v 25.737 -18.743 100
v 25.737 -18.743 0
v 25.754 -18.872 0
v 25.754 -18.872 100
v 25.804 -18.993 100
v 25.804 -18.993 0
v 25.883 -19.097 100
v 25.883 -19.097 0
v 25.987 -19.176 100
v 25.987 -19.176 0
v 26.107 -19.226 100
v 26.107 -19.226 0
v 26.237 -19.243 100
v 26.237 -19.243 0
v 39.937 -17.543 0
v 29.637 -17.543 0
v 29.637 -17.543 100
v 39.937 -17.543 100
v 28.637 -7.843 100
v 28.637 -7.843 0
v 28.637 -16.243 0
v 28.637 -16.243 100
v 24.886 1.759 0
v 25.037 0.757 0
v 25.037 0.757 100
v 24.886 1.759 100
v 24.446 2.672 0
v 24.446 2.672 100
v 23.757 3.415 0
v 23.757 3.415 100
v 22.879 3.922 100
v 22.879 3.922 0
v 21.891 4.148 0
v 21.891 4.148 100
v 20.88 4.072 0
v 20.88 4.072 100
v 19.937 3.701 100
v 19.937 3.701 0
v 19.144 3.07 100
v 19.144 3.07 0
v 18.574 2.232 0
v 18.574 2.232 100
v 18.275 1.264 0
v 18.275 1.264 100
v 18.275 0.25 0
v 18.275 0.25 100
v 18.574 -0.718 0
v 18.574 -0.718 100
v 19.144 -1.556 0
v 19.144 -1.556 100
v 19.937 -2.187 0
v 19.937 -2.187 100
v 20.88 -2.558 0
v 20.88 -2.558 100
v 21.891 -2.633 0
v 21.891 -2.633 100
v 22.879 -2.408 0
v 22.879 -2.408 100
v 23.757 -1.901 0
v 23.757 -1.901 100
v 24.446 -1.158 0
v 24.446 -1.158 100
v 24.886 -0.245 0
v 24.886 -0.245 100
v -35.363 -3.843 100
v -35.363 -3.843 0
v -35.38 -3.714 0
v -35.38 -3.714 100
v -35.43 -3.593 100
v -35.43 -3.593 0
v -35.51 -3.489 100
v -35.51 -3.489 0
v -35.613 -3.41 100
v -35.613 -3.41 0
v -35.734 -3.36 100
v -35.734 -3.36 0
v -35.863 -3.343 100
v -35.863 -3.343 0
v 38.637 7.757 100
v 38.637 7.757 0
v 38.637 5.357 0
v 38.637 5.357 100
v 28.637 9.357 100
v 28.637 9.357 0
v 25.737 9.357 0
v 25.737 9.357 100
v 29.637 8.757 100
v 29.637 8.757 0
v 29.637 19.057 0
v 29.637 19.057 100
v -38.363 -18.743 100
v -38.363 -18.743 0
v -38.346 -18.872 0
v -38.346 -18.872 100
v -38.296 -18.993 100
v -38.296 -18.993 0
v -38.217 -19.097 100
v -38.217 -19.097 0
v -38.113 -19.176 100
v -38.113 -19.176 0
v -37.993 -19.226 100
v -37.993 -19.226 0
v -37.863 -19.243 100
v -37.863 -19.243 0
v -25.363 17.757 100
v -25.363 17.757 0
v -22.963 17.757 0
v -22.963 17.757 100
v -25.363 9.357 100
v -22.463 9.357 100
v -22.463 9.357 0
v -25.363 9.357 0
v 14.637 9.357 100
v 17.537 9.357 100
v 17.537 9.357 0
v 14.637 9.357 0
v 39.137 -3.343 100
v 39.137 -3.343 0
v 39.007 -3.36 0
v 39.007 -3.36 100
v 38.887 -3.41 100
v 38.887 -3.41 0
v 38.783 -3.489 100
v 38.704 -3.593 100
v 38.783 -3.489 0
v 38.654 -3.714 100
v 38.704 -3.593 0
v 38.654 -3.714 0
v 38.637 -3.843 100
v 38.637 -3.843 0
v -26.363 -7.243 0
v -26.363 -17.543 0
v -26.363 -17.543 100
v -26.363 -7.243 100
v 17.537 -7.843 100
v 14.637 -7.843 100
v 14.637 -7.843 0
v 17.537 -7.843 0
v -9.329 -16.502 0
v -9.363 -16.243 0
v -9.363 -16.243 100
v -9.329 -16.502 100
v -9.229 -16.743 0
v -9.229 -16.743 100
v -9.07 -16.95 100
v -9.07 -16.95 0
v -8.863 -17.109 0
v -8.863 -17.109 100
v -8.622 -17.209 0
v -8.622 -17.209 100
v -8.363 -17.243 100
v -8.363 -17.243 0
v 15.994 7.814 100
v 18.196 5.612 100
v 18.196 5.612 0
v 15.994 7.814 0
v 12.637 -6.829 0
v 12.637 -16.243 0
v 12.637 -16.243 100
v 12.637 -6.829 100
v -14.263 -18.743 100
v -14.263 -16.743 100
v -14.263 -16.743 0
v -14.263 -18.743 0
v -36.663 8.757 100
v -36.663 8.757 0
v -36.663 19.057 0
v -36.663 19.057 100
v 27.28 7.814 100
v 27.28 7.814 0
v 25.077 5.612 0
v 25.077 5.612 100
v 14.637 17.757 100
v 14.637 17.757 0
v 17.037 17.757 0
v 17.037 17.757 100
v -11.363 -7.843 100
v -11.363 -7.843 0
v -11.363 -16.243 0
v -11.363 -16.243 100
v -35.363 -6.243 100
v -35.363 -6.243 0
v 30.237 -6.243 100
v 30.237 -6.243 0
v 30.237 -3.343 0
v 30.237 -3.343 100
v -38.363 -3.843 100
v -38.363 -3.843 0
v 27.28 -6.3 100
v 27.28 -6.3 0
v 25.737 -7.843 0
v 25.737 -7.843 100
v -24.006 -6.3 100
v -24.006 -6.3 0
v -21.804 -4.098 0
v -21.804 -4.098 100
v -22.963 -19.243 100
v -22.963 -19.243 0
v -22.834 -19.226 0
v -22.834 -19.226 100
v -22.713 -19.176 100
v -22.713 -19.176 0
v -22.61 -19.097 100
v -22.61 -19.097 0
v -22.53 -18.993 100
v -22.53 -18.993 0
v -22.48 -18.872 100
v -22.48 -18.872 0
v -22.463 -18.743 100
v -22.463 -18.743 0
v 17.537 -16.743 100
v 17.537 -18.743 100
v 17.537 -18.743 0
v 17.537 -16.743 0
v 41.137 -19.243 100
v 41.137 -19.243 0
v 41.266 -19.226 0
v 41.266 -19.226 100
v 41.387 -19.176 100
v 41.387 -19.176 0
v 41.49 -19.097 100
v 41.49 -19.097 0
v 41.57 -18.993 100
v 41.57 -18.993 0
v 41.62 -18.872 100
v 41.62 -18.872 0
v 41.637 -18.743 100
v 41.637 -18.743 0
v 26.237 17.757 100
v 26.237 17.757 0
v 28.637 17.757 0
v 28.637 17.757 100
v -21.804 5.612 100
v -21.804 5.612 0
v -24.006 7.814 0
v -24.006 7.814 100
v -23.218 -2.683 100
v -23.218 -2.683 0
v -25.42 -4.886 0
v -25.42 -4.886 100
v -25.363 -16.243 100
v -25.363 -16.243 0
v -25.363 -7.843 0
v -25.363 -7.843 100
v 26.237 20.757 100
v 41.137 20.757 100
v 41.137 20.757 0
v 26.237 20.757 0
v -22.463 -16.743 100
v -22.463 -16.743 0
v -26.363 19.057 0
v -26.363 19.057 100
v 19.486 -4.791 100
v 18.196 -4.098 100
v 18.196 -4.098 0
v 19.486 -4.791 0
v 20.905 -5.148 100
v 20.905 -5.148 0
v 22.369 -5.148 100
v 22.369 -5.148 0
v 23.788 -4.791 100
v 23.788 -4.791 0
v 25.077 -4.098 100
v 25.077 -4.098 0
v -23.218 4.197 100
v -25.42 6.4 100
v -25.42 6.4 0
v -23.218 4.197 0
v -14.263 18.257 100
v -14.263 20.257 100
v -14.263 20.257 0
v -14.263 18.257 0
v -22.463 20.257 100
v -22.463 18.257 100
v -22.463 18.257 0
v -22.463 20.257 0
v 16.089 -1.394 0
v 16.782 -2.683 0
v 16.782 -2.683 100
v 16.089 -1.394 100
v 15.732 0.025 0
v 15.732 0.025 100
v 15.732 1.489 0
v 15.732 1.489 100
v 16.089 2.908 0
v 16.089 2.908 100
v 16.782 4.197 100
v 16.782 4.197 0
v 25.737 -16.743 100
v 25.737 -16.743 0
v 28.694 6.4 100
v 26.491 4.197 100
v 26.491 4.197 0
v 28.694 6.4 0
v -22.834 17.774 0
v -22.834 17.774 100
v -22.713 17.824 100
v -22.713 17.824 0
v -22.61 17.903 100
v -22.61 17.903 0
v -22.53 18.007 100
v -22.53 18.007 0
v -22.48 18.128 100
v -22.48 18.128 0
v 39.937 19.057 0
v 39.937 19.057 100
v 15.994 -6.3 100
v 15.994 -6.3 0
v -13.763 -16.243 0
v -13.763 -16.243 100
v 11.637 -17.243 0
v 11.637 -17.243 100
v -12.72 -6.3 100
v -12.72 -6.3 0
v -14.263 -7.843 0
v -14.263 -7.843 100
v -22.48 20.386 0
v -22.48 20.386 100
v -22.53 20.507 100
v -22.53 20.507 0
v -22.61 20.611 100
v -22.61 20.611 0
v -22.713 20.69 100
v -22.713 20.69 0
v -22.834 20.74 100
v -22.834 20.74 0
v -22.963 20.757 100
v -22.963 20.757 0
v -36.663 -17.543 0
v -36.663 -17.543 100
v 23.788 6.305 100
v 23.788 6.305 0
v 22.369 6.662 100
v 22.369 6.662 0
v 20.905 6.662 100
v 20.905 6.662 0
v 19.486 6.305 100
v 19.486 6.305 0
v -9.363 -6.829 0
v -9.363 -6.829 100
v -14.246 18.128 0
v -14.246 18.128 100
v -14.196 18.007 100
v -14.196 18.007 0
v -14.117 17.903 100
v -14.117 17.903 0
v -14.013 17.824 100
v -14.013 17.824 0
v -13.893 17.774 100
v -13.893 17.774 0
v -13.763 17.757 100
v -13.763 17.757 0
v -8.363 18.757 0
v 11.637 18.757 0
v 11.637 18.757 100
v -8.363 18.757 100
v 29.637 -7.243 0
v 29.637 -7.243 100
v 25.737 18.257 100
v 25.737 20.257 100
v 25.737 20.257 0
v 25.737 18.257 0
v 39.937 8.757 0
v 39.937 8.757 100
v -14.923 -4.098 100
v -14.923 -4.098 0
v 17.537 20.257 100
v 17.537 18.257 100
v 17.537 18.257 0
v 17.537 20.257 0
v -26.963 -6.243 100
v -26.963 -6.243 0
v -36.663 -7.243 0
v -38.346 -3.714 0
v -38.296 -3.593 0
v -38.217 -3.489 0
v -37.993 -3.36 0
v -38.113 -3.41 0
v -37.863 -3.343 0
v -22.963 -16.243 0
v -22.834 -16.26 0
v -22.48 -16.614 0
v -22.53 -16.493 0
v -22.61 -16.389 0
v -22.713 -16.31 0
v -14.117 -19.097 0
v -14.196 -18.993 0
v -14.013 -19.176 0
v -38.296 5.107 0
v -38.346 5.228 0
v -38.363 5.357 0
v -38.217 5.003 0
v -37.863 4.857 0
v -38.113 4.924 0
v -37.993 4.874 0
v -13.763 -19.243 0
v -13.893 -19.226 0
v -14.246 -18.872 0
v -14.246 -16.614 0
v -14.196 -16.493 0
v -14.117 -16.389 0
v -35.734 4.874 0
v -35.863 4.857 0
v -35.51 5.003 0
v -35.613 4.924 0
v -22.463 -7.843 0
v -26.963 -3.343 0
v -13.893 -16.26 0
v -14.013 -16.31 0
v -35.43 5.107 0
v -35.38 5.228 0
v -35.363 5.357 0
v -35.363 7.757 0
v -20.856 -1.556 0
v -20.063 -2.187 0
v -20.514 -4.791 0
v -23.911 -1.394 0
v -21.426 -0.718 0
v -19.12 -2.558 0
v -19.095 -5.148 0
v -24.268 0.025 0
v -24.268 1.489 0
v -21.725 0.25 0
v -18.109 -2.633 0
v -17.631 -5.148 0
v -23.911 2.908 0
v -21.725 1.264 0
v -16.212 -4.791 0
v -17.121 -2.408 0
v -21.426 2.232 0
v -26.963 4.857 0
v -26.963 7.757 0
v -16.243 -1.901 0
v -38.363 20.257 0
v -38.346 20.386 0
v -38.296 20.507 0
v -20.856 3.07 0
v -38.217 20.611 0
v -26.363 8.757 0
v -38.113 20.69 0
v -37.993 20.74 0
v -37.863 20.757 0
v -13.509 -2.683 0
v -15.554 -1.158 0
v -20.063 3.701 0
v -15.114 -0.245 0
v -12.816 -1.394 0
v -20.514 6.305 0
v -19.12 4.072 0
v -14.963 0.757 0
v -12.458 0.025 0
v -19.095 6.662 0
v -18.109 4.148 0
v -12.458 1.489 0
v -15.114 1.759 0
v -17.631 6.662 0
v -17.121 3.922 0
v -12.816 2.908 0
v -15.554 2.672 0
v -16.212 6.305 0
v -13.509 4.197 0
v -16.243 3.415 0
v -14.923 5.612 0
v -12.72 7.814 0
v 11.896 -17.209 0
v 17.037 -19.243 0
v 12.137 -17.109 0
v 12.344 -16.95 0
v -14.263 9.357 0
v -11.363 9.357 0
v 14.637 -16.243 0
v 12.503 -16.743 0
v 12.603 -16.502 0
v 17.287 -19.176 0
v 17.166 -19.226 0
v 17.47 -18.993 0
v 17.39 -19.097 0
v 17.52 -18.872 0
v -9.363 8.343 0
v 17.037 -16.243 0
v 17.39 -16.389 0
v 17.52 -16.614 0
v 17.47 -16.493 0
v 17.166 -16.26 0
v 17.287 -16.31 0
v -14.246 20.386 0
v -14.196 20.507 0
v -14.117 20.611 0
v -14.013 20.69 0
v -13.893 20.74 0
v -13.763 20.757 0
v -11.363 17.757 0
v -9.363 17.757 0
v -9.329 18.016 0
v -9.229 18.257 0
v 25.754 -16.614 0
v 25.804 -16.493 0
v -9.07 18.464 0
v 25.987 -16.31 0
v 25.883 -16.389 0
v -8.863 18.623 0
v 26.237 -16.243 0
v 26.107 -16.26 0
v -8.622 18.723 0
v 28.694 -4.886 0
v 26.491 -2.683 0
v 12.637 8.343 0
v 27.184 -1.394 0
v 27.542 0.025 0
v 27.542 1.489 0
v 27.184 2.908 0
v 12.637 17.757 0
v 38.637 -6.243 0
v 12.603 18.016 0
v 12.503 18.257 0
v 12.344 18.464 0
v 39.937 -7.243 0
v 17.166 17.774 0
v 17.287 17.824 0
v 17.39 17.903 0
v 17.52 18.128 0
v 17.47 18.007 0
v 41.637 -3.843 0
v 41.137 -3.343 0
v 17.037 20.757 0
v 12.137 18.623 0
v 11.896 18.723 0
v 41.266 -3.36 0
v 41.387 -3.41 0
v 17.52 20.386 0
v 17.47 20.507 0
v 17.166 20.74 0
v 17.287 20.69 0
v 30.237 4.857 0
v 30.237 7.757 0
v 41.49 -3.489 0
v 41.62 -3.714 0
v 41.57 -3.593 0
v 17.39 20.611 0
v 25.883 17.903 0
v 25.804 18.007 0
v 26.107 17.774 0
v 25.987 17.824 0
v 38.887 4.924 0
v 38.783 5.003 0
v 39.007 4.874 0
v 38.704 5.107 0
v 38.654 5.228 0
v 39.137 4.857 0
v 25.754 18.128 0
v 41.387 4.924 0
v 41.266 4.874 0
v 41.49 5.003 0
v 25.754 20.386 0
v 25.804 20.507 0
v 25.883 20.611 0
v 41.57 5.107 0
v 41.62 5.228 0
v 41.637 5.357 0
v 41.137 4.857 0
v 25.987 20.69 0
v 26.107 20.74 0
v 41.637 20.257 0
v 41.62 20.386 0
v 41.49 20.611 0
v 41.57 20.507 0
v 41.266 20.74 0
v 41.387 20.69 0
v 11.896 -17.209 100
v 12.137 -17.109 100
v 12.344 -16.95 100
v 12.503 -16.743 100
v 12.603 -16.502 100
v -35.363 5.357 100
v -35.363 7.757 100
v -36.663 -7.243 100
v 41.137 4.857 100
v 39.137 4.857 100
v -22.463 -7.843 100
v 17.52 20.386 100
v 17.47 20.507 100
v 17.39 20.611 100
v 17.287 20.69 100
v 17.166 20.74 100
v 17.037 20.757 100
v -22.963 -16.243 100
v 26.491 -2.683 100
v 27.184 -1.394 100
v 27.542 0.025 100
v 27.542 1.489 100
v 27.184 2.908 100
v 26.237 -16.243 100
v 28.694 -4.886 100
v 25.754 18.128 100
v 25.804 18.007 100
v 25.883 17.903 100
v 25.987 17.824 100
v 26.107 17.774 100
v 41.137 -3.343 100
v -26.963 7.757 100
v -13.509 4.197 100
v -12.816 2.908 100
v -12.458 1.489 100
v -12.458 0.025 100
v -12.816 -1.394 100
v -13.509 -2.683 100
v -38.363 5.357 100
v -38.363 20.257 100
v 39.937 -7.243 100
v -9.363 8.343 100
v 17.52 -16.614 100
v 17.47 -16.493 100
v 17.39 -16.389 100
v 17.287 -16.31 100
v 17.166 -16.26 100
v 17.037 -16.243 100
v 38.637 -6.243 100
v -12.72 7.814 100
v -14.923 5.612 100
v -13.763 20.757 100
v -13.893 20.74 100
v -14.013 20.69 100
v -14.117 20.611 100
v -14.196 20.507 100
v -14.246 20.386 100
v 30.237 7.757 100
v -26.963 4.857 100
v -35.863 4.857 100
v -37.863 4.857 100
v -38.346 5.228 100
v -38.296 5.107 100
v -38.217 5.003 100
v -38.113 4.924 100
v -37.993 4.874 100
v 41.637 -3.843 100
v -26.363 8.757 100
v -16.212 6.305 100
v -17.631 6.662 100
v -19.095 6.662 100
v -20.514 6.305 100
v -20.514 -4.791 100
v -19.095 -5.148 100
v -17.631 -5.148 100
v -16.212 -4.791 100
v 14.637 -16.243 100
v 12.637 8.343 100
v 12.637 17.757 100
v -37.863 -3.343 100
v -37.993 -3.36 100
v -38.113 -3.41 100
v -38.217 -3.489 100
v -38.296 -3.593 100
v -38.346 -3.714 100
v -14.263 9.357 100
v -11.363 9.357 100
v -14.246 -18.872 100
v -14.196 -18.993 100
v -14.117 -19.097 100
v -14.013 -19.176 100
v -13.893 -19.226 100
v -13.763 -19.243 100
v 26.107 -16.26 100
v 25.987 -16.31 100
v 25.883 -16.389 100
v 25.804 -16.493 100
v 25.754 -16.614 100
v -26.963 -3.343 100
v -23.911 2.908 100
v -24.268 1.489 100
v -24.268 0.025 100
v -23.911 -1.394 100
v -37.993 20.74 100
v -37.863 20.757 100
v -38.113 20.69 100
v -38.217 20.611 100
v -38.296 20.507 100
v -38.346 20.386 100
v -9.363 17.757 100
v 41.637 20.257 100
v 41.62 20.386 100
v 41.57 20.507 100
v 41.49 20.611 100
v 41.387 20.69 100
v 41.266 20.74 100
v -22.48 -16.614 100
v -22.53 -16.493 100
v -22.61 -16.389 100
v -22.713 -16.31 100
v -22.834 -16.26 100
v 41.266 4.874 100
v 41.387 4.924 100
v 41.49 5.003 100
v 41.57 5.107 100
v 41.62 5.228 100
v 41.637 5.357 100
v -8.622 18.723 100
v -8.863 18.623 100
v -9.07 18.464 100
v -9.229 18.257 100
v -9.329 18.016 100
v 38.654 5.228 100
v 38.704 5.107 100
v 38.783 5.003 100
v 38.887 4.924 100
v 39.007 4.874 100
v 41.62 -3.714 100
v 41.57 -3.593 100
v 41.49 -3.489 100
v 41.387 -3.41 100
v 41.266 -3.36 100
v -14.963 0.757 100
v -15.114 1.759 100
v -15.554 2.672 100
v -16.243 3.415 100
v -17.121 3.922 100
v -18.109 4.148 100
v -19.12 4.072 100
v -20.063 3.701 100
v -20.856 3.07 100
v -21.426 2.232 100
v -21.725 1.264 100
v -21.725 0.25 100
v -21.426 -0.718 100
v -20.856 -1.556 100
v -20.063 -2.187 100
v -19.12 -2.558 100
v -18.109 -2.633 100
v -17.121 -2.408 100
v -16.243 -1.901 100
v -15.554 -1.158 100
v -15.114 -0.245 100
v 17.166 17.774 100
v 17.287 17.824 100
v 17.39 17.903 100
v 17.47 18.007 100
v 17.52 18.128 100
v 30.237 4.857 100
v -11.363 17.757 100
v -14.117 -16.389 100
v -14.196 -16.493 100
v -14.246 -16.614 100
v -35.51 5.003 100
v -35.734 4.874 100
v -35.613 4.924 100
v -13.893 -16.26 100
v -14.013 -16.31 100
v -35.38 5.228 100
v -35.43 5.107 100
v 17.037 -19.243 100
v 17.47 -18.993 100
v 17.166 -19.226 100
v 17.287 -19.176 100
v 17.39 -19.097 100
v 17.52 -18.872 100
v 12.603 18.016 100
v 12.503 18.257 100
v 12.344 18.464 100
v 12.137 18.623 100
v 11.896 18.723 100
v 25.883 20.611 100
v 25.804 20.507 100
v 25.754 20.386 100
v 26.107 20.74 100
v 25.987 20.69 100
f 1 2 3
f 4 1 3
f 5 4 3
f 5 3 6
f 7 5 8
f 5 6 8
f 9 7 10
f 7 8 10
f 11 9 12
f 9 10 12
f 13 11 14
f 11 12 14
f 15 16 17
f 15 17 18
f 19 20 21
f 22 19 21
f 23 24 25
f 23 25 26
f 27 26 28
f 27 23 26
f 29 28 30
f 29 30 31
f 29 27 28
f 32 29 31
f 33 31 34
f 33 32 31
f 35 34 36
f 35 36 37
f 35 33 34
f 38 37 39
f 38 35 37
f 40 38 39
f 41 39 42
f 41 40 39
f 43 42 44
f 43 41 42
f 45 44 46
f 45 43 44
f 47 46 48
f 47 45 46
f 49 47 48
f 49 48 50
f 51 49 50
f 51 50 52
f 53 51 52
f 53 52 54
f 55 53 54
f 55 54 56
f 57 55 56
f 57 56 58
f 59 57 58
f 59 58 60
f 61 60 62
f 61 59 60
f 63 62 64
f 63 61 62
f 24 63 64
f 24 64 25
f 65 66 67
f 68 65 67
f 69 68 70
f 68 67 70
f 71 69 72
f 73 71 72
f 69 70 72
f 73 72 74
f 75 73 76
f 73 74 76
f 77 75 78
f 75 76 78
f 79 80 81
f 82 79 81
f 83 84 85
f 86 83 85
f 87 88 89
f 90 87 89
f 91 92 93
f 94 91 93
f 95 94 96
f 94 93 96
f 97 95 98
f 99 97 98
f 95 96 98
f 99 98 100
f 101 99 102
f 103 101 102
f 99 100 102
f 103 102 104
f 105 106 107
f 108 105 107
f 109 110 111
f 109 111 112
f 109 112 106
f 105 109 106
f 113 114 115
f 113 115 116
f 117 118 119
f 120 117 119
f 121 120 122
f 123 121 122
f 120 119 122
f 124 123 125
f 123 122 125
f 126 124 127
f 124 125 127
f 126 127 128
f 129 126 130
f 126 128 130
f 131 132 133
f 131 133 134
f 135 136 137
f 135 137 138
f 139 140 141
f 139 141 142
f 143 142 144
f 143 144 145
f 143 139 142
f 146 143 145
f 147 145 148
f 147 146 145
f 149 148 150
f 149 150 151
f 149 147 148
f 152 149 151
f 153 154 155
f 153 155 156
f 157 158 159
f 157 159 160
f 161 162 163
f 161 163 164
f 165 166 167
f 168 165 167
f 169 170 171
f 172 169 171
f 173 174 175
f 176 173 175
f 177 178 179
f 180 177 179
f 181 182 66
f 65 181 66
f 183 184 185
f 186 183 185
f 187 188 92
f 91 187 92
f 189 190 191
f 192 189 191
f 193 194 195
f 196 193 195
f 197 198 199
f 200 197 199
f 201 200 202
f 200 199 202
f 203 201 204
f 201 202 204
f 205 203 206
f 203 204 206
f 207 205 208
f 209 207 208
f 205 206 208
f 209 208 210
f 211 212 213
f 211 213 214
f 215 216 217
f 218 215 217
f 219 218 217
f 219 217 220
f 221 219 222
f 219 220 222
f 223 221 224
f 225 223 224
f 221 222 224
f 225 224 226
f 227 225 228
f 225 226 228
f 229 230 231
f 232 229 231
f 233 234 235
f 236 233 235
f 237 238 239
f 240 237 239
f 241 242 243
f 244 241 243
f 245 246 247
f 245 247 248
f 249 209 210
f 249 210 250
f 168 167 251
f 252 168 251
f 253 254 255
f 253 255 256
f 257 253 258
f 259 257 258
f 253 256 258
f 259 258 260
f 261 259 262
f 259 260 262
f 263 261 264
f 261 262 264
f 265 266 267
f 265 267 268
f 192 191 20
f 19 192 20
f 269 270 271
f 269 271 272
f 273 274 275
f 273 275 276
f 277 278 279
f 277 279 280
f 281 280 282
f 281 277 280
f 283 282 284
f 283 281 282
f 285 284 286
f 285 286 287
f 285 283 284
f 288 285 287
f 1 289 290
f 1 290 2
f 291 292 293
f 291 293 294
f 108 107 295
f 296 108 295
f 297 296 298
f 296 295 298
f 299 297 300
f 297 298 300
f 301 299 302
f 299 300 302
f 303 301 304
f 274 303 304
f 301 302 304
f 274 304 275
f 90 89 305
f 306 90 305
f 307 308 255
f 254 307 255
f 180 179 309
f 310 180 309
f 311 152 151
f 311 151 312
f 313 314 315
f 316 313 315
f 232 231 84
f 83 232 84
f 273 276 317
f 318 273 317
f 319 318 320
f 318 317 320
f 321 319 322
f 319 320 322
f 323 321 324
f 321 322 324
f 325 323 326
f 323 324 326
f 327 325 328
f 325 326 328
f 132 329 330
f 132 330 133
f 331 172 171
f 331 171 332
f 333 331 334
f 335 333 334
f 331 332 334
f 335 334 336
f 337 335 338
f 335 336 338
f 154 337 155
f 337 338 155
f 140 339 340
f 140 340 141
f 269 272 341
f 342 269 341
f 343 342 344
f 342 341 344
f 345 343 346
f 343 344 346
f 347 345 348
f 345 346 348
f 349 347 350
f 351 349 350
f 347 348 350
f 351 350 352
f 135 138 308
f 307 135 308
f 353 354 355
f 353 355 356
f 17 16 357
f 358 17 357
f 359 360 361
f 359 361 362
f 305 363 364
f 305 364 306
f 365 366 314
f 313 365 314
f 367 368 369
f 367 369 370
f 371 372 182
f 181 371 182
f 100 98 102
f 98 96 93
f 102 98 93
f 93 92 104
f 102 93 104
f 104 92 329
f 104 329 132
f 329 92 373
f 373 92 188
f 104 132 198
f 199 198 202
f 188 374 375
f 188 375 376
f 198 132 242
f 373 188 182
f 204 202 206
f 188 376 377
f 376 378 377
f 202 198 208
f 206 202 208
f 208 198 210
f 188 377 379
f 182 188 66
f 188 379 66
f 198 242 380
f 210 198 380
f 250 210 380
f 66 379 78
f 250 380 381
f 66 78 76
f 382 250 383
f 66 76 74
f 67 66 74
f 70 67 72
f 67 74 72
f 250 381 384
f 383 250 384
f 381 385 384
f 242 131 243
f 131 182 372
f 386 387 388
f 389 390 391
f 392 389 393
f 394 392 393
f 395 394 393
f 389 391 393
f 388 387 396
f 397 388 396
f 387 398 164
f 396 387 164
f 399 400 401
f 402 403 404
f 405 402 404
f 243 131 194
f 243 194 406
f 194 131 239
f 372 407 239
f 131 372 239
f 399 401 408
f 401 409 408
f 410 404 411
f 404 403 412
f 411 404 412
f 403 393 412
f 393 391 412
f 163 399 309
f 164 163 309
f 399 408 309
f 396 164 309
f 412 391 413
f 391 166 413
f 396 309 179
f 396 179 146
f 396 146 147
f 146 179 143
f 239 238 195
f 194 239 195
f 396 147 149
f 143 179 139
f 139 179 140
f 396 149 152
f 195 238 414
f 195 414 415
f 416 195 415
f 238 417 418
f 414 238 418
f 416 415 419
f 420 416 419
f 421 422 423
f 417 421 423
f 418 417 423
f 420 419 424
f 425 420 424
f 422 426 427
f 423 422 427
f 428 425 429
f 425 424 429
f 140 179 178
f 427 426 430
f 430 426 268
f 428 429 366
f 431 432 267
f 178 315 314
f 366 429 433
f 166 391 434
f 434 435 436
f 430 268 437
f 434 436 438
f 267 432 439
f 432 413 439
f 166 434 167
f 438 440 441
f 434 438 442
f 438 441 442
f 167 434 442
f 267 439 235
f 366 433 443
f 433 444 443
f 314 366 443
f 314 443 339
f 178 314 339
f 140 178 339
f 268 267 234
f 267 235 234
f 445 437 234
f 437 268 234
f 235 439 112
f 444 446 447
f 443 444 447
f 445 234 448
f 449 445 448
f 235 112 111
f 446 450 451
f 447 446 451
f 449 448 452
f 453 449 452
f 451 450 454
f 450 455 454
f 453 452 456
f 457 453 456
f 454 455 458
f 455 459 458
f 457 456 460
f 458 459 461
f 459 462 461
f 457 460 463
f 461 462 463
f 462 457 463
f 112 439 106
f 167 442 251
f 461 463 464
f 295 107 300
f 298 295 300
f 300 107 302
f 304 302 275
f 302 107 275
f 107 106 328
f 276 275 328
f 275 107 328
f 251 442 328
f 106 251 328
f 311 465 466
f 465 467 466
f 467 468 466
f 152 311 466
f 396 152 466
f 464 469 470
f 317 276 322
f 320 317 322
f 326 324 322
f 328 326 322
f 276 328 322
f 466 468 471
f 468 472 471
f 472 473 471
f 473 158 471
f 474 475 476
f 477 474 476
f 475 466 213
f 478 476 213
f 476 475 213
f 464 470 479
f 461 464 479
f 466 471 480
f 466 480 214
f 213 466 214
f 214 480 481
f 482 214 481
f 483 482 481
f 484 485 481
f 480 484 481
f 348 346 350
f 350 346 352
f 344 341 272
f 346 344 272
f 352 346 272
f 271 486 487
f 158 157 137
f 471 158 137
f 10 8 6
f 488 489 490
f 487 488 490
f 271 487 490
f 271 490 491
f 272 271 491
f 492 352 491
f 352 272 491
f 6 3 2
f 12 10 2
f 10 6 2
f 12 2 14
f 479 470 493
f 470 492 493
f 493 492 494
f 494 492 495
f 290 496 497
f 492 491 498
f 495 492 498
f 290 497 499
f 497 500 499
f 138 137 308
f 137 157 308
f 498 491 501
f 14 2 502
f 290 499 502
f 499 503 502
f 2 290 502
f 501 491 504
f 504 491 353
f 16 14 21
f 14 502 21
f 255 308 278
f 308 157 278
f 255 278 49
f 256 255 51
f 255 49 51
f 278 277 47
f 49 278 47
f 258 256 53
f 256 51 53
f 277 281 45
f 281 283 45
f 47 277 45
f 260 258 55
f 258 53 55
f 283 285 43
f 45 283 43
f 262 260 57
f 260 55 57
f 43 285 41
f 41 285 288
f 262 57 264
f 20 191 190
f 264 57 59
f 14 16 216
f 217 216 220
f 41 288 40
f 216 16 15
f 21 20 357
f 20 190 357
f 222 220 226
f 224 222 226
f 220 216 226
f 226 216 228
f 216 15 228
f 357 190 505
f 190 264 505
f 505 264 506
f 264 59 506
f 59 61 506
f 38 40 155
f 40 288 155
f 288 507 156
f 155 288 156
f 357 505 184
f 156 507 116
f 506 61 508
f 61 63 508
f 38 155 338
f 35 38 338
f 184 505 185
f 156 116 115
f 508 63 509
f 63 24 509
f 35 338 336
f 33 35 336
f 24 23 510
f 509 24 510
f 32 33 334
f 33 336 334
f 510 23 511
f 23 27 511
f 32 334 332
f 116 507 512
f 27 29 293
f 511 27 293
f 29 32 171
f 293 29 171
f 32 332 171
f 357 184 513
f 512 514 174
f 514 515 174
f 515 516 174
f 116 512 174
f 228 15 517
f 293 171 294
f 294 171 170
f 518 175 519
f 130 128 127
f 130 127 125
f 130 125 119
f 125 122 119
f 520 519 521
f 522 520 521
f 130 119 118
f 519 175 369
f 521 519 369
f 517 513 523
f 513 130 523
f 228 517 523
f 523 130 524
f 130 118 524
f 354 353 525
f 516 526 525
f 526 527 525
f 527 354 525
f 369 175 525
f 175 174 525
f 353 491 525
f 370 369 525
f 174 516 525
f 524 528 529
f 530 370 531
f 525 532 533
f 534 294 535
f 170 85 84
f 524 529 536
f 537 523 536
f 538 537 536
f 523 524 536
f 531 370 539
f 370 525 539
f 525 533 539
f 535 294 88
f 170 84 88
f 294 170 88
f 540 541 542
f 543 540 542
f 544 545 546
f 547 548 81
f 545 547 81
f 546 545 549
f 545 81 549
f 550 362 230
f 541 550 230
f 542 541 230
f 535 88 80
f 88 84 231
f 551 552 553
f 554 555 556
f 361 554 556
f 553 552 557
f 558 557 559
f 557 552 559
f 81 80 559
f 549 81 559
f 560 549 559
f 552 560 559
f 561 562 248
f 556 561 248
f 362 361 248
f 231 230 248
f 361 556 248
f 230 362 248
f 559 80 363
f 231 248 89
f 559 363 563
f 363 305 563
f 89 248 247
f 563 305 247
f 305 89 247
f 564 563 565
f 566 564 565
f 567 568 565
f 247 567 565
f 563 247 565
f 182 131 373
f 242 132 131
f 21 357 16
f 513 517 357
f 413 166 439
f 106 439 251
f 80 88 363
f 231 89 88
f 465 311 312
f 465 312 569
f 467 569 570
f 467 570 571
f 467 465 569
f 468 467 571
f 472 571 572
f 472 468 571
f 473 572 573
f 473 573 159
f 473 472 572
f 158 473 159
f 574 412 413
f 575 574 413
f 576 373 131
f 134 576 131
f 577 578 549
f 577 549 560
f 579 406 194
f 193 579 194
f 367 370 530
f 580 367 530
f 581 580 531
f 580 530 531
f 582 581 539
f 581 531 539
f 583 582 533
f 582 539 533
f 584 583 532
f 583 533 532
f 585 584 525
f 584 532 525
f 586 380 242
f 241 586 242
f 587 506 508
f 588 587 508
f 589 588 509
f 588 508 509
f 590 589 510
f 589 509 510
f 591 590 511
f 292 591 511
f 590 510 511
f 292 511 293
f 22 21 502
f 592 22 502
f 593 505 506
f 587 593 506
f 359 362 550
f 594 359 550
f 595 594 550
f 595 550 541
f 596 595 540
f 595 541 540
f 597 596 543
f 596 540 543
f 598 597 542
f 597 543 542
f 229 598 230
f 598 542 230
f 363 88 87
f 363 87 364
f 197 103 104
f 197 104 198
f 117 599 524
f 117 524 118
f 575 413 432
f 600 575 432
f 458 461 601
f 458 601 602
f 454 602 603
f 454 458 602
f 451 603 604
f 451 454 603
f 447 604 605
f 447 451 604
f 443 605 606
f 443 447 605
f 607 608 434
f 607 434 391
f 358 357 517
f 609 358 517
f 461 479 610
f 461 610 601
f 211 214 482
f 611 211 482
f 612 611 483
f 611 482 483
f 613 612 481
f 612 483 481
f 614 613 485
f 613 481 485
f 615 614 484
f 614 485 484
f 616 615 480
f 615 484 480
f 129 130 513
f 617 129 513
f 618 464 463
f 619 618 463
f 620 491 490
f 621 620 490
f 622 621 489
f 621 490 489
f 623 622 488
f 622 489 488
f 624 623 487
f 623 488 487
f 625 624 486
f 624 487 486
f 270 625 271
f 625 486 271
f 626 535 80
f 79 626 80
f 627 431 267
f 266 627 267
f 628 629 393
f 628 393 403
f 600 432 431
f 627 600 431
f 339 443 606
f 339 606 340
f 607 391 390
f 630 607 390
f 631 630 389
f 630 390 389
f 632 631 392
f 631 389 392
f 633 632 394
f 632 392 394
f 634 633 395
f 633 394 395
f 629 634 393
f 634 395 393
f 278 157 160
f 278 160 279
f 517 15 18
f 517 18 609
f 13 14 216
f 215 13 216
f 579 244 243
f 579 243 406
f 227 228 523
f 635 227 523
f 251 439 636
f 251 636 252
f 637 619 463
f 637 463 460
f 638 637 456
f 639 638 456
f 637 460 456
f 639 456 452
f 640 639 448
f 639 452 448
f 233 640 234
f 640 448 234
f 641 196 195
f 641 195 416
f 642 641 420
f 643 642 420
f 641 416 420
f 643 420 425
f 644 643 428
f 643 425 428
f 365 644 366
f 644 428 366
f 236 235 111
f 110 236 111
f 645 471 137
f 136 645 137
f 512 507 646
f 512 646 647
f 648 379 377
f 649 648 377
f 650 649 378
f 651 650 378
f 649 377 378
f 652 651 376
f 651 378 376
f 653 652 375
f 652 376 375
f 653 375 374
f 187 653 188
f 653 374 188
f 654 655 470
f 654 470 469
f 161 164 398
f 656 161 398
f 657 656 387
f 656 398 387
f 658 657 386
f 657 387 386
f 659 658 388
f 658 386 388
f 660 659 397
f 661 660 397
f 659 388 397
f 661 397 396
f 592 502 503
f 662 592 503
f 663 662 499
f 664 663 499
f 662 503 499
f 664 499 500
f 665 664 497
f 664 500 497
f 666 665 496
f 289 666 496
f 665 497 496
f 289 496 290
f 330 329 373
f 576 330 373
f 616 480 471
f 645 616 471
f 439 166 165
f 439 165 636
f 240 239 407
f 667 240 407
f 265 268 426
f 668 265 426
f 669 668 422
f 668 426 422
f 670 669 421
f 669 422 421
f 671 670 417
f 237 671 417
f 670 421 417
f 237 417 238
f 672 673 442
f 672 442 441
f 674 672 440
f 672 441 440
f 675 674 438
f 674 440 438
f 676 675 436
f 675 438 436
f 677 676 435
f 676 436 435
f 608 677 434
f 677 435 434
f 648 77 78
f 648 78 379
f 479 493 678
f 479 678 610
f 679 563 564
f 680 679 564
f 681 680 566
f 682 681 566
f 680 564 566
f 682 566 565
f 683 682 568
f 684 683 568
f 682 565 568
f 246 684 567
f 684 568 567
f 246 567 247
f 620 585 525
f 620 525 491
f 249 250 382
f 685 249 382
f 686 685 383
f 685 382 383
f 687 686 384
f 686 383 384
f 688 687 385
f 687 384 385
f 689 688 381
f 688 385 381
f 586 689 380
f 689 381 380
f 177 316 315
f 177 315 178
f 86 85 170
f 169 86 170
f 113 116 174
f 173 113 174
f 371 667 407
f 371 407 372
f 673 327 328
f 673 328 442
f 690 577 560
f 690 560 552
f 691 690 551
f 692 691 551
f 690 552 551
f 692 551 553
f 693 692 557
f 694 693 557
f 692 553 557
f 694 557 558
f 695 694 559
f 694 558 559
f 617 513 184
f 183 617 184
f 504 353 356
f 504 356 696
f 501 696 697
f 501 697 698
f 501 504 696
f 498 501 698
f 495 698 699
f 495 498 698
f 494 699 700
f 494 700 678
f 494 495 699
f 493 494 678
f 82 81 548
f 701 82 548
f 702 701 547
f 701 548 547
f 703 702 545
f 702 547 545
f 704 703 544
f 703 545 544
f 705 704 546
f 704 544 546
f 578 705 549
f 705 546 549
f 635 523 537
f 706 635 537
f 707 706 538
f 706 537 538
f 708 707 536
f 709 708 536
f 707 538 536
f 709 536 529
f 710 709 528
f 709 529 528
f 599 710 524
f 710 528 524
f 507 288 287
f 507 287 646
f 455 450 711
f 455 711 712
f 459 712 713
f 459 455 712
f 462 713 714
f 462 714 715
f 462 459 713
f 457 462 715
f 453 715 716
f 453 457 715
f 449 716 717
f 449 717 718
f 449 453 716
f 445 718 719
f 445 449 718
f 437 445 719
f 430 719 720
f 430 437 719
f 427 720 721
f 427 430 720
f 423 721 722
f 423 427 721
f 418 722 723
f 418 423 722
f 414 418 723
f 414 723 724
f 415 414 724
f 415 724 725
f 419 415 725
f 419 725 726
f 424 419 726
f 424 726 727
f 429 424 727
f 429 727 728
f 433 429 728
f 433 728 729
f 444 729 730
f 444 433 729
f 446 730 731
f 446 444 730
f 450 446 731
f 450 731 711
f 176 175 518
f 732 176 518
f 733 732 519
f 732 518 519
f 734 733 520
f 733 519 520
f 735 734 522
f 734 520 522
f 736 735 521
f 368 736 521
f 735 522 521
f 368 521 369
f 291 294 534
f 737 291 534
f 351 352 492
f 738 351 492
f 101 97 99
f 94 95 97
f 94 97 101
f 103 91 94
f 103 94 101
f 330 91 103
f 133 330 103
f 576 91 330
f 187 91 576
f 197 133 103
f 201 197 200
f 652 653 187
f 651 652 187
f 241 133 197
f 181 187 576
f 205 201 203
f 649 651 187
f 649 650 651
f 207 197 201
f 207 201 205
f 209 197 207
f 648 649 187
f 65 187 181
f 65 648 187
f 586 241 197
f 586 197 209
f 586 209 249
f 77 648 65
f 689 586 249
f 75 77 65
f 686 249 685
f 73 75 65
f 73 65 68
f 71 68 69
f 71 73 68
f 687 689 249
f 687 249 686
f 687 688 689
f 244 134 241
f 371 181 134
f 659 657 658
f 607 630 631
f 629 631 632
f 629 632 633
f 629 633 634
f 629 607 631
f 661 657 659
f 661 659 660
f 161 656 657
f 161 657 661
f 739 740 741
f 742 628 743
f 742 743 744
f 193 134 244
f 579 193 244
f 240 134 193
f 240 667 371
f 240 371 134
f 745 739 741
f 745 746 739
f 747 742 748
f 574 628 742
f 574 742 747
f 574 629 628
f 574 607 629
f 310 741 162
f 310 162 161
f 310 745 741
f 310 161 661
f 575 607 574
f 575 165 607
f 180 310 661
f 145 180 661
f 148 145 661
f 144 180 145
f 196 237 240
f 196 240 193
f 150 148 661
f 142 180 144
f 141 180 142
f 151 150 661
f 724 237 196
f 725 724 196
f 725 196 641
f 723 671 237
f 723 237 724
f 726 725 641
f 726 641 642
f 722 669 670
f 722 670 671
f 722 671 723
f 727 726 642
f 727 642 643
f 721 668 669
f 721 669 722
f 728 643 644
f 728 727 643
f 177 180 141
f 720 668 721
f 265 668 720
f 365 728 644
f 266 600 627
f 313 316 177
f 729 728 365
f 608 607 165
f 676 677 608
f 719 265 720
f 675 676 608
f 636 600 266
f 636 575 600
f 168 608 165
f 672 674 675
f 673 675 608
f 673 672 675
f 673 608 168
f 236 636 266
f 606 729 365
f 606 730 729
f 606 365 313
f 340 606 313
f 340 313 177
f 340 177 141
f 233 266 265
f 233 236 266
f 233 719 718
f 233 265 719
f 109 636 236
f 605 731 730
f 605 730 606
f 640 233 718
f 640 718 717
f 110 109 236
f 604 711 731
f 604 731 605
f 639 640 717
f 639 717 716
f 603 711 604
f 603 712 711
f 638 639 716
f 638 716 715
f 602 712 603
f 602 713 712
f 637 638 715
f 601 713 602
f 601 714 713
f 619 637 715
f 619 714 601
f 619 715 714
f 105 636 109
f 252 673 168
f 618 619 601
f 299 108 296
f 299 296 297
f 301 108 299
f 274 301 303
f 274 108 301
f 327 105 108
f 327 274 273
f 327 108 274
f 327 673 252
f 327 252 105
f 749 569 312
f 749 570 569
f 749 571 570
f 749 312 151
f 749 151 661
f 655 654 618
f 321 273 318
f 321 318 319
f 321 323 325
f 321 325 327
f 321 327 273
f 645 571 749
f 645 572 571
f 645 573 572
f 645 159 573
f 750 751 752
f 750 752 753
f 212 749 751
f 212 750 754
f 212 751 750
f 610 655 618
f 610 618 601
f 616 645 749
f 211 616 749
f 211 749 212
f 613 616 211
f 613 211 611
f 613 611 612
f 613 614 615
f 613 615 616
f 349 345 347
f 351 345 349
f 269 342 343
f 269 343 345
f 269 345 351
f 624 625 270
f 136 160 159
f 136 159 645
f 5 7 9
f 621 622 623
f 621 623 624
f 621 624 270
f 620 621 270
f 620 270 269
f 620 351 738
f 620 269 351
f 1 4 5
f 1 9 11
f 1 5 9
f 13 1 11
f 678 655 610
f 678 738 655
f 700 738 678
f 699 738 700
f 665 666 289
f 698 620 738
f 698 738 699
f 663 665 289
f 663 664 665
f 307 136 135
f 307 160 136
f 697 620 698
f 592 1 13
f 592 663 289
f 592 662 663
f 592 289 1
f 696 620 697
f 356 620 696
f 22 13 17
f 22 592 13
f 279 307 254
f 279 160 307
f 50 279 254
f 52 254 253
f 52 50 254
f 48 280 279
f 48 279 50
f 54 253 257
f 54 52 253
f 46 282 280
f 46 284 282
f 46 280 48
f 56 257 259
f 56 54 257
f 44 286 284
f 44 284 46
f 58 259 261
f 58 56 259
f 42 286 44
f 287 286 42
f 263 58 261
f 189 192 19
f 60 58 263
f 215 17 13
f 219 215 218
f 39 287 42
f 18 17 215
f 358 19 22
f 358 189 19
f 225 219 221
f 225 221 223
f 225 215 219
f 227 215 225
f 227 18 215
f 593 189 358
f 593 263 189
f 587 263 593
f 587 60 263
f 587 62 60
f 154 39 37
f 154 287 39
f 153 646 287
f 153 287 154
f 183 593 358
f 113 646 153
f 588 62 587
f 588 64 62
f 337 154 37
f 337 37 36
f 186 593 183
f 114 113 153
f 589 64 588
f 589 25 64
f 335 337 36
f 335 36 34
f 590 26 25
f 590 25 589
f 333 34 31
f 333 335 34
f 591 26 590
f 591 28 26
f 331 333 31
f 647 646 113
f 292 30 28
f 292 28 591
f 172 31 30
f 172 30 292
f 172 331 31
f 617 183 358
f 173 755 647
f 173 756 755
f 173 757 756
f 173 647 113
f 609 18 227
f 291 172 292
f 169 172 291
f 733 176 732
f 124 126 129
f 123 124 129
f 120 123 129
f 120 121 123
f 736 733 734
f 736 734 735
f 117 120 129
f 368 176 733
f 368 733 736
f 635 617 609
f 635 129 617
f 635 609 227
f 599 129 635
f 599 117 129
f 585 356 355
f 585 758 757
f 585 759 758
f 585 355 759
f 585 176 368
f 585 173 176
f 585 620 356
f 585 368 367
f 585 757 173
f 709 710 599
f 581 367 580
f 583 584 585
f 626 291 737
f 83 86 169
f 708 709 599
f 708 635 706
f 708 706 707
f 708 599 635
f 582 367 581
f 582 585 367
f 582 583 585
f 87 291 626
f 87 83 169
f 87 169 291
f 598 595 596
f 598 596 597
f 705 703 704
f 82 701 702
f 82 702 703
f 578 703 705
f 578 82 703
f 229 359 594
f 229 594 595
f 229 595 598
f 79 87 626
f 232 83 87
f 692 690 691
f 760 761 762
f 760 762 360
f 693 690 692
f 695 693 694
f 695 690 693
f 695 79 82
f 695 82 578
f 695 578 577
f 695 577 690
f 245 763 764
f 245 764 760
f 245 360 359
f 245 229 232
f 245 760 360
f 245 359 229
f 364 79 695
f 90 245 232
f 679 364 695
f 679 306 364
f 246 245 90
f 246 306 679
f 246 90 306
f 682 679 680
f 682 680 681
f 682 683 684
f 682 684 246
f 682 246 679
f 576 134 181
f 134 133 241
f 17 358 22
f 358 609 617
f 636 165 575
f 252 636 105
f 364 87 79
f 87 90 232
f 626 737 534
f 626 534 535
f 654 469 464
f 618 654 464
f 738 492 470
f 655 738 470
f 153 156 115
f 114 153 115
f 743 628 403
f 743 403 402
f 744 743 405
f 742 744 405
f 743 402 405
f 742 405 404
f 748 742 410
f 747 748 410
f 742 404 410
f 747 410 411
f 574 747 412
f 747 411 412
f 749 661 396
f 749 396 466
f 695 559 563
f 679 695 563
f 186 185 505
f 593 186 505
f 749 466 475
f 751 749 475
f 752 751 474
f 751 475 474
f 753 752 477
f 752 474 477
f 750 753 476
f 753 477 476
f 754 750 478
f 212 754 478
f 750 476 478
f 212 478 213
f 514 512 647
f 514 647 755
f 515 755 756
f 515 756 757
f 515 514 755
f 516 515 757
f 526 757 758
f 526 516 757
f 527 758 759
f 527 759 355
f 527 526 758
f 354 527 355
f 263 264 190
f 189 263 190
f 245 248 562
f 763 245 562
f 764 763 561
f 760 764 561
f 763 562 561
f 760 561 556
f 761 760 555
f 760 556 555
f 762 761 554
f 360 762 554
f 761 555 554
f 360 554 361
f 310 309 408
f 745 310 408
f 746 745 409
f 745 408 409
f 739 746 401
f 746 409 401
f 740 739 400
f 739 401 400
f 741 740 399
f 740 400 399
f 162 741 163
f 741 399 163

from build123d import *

# Parameters (mm, degrees)
SKETCH_1_R      = 3.4
SKETCH_1_W      = 10.3
SKETCH_1_H      = 10.3
EXTRUDE_1_DEPTH = 100


with BuildPart() as part:
    # 草图1 → 凸台-拉伸1 (new body)
    with BuildSketch(Plane.XY):
        with BuildLine():
            Line((-22.463172707, 9.357012623), (-25.363172707, 9.357012623))
            Line((-25.363172707, 9.357012623), (-25.363172707, 17.757012623))
            Line((-25.363172707, 17.757012623), (-22.963172707, 17.757012623))
            ThreePointArc((-22.963172707, 17.757012623), (-22.609619316, 17.903459232), (-22.463172707, 18.257012623))
            Line((-22.463172707, 18.257012623), (-22.463172707, 20.257012623))
            ThreePointArc((-22.463172707, 20.257012623), (-22.609619316, 20.610566013), (-22.963172707, 20.757012623))
            Line((-22.963172707, 20.757012623), (-37.863172707, 20.757012623))
            ThreePointArc((-37.863172707, 20.757012623), (-38.216726098, 20.610566013), (-38.363172707, 20.257012623))
            Line((-38.363172707, 20.257012623), (-38.363172707, 5.357012623))
            ThreePointArc((-38.363172707, 5.357012623), (-38.216726098, 5.003459232), (-37.863172707, 4.857012623))
            Line((-37.863172707, 4.857012623), (-35.863172707, 4.857012623))
            ThreePointArc((-35.863172707, 4.857012623), (-35.509619316, 5.003459232), (-35.363172707, 5.357012623))
            Line((-35.363172707, 5.357012623), (-35.363172707, 7.757012623))
            Line((-35.363172707, 7.757012623), (-26.963172707, 7.757012623))
            Line((-26.963172707, 7.757012623), (-26.963172707, 4.857012623))
            Line((-26.963172707, 4.857012623), (-25.420279488, 6.399905842))
            Line((-25.420279488, 6.399905842), (-23.217718457, 4.19734481))
            ThreePointArc((-23.217718457, 4.19734481), (-24.313172707, 0.757012623), (-23.217718457, -2.683319565))
            Line((-23.217718457, -2.683319565), (-25.420279488, -4.885880596))
            Line((-25.420279488, -4.885880596), (-26.963172707, -3.342987377))
            Line((-26.963172707, -3.342987377), (-26.963172707, -6.242987377))
            Line((-26.963172707, -6.242987377), (-35.363172707, -6.242987377))
            Line((-35.363172707, -6.242987377), (-35.363172707, -3.842987377))
            ThreePointArc((-35.363172707, -3.842987377), (-35.509619316, -3.489433987), (-35.863172707, -3.342987377))
            Line((-35.863172707, -3.342987377), (-37.863172707, -3.342987377))
            ThreePointArc((-37.863172707, -3.342987377), (-38.216726098, -3.489433987), (-38.363172707, -3.842987377))
            Line((-38.363172707, -3.842987377), (-38.363172707, -18.742987377))
            ThreePointArc((-38.363172707, -18.742987377), (-38.216726098, -19.096540768), (-37.863172707, -19.242987377))
            Line((-37.863172707, -19.242987377), (-22.963172707, -19.242987377))
            ThreePointArc((-22.963172707, -19.242987377), (-22.609619316, -19.096540768), (-22.463172707, -18.742987377))
            Line((-22.463172707, -18.742987377), (-22.463172707, -16.742987377))
            ThreePointArc((-22.463172707, -16.742987377), (-22.609619316, -16.389433987), (-22.963172707, -16.242987377))
            Line((-22.963172707, -16.242987377), (-25.363172707, -16.242987377))
            Line((-25.363172707, -16.242987377), (-25.363172707, -7.842987377))
            Line((-25.363172707, -7.842987377), (-22.463172707, -7.842987377))
            Line((-22.463172707, -7.842987377), (-24.006065926, -6.300094158))
            Line((-24.006065926, -6.300094158), (-21.803504895, -4.097533127))
            ThreePointArc((-21.803504895, -4.097533127), (-18.363172707, -5.192987377), (-14.922840519, -4.097533127))
            Line((-14.922840519, -4.097533127), (-12.720279488, -6.300094158))
            Line((-12.720279488, -6.300094158), (-14.263172707, -7.842987377))
            Line((-14.263172707, -7.842987377), (-11.363172707, -7.842987377))
            Line((-11.363172707, -7.842987377), (-11.363172707, -16.242987377))
            Line((-11.363172707, -16.242987377), (-13.763172707, -16.242987377))
            ThreePointArc((-13.763172707, -16.242987377), (-14.116726098, -16.389433987), (-14.263172707, -16.742987377))
            Line((-14.263172707, -16.742987377), (-14.263172707, -18.742987377))
            ThreePointArc((-14.263172707, -18.742987377), (-14.116726098, -19.096540768), (-13.763172707, -19.242987377))
            Line((-13.763172707, -19.242987377), (1.136827293, -19.242987377))
            Line((1.136827293, -19.242987377), (2.136827293, -19.242987377))
            Line((2.136827293, -19.242987377), (17.036827293, -19.242987377))
            ThreePointArc((17.036827293, -19.242987377), (17.390380684, -19.096540768), (17.536827293, -18.742987377))
            Line((17.536827293, -18.742987377), (17.536827293, -16.742987377))
            ThreePointArc((17.536827293, -16.742987377), (17.390380684, -16.389433987), (17.036827293, -16.242987377))
            Line((17.036827293, -16.242987377), (14.636827293, -16.242987377))
            Line((14.636827293, -16.242987377), (14.636827293, -7.842987377))
            Line((14.636827293, -7.842987377), (17.536827293, -7.842987377))
            Line((17.536827293, -7.842987377), (15.993934074, -6.300094158))
            Line((15.993934074, -6.300094158), (18.196495105, -4.097533127))
            ThreePointArc((18.196495105, -4.097533127), (21.636827293, -5.192987377), (25.077159481, -4.097533127))
            Line((25.077159481, -4.097533127), (27.279720512, -6.300094158))
            Line((27.279720512, -6.300094158), (25.736827293, -7.842987377))
            Line((25.736827293, -7.842987377), (28.636827293, -7.842987377))
            Line((28.636827293, -7.842987377), (28.636827293, -16.242987377))
            Line((28.636827293, -16.242987377), (26.236827293, -16.242987377))
            ThreePointArc((26.236827293, -16.242987377), (25.883273902, -16.389433987), (25.736827293, -16.742987377))
            Line((25.736827293, -16.742987377), (25.736827293, -18.742987377))
            ThreePointArc((25.736827293, -18.742987377), (25.883273902, -19.096540768), (26.236827293, -19.242987377))
            Line((26.236827293, -19.242987377), (41.136827293, -19.242987377))
            ThreePointArc((41.136827293, -19.242987377), (41.490380684, -19.096540768), (41.636827293, -18.742987377))
            Line((41.636827293, -18.742987377), (41.636827293, -3.842987377))
            ThreePointArc((41.636827293, -3.842987377), (41.490380684, -3.489433987), (41.136827293, -3.342987377))
            Line((41.136827293, -3.342987377), (39.136827293, -3.342987377))
            ThreePointArc((39.136827293, -3.342987377), (38.783273902, -3.489433987), (38.636827293, -3.842987377))
            Line((38.636827293, -3.842987377), (38.636827293, -6.242987377))
            Line((38.636827293, -6.242987377), (30.236827293, -6.242987377))
            Line((30.236827293, -6.242987377), (30.236827293, -3.342987377))
            Line((30.236827293, -3.342987377), (28.693934074, -4.885880596))
            Line((28.693934074, -4.885880596), (26.491373043, -2.683319565))
            ThreePointArc((26.491373043, -2.683319565), (27.586827293, 0.757012623), (26.491373043, 4.19734481))
            Line((26.491373043, 4.19734481), (28.693934074, 6.399905842))
            Line((28.693934074, 6.399905842), (30.236827293, 4.857012623))
            Line((30.236827293, 4.857012623), (30.236827293, 7.757012623))
            Line((30.236827293, 7.757012623), (38.636827293, 7.757012623))
            Line((38.636827293, 7.757012623), (38.636827293, 5.357012623))
            ThreePointArc((38.636827293, 5.357012623), (38.783273902, 5.003459232), (39.136827293, 4.857012623))
            Line((39.136827293, 4.857012623), (41.136827293, 4.857012623))
            ThreePointArc((41.136827293, 4.857012623), (41.490380684, 5.003459232), (41.636827293, 5.357012623))
            Line((41.636827293, 5.357012623), (41.636827293, 20.257012623))
            ThreePointArc((41.636827293, 20.257012623), (41.490380684, 20.610566013), (41.136827293, 20.757012623))
            Line((41.136827293, 20.757012623), (26.236827293, 20.757012623))
            ThreePointArc((26.236827293, 20.757012623), (25.883273902, 20.610566013), (25.736827293, 20.257012623))
            Line((25.736827293, 20.257012623), (25.736827293, 18.257012623))
            ThreePointArc((25.736827293, 18.257012623), (25.883273902, 17.903459232), (26.236827293, 17.757012623))
            Line((26.236827293, 17.757012623), (28.636827293, 17.757012623))
            Line((28.636827293, 17.757012623), (28.636827293, 9.357012623))
            Line((28.636827293, 9.357012623), (25.736827293, 9.357012623))
            Line((25.736827293, 9.357012623), (27.279720512, 7.814119404))
            Line((27.279720512, 7.814119404), (25.077159481, 5.611558373))
            ThreePointArc((25.077159481, 5.611558373), (21.636827293, 6.707012623), (18.196495105, 5.611558373))
            Line((18.196495105, 5.611558373), (15.993934074, 7.814119404))
            Line((15.993934074, 7.814119404), (17.536827293, 9.357012623))
            Line((17.536827293, 9.357012623), (14.636827293, 9.357012623))
            Line((14.636827293, 9.357012623), (14.636827293, 17.757012623))
            Line((14.636827293, 17.757012623), (17.036827293, 17.757012623))
            ThreePointArc((17.036827293, 17.757012623), (17.390380684, 17.903459232), (17.536827293, 18.257012623))
            Line((17.536827293, 18.257012623), (17.536827293, 20.257012623))
            ThreePointArc((17.536827293, 20.257012623), (17.390380684, 20.610566013), (17.036827293, 20.757012623))
            Line((17.036827293, 20.757012623), (2.136827293, 20.757012623))
            Line((2.136827293, 20.757012623), (1.136827293, 20.757012623))
            Line((1.136827293, 20.757012623), (-13.763172707, 20.757012623))
            ThreePointArc((-13.763172707, 20.757012623), (-14.116726098, 20.610566013), (-14.263172707, 20.257012623))
            Line((-14.263172707, 20.257012623), (-14.263172707, 18.257012623))
            ThreePointArc((-14.263172707, 18.257012623), (-14.116726098, 17.903459232), (-13.763172707, 17.757012623))
            Line((-13.763172707, 17.757012623), (-11.363172707, 17.757012623))
            Line((-11.363172707, 17.757012623), (-11.363172707, 9.357012623))
            Line((-11.363172707, 9.357012623), (-14.263172707, 9.357012623))
            Line((-14.263172707, 9.357012623), (-12.720279488, 7.814119404))
            Line((-12.720279488, 7.814119404), (-14.922840519, 5.611558373))
            ThreePointArc((-14.922840519, 5.611558373), (-18.363172707, 6.707012623), (-21.803504895, 5.611558373))
            Line((-21.803504895, 5.611558373), (-24.006065926, 7.814119404))
            Line((-24.006065926, 7.814119404), (-22.463172707, 9.357012623))
        make_face()
        with Locations((-18.363172707, 0.757012623)):
            Circle(SKETCH_1_R, mode=Mode.SUBTRACT)
        with Locations((21.636827293, 0.757012623)):
            Circle(SKETCH_1_R, mode=Mode.SUBTRACT)
        with Locations((-31.513172707, 13.907012623)):
            Rectangle(SKETCH_1_W, SKETCH_1_H, mode=Mode.SUBTRACT)
        with BuildLine():
            Line((-9.363172707, 17.757012623), (-9.363172707, 8.34279906))
            Line((-9.363172707, 8.34279906), (-13.508626957, 4.19734481))
            ThreePointArc((-13.508626957, 4.19734481), (-12.413172707, 0.757012623), (-13.508626957, -2.683319565))
            Line((-13.508626957, -2.683319565), (-9.363172707, -6.828773815))
            Line((-9.363172707, -6.828773815), (-9.363172707, -16.242987377))
            ThreePointArc((-9.363172707, -16.242987377), (-9.070279488, -16.950094158), (-8.363172707, -17.242987377))
            Line((-8.363172707, -17.242987377), (11.636827293, -17.242987377))
            ThreePointArc((11.636827293, -17.242987377), (12.343934074, -16.950094158), (12.636827293, -16.242987377))
            Line((12.636827293, -16.242987377), (12.636827293, -6.828773815))
            Line((12.636827293, -6.828773815), (16.782281543, -2.683319565))
            ThreePointArc((16.782281543, -2.683319565), (15.686827293, 0.757012623), (16.782281543, 4.19734481))
            Line((16.782281543, 4.19734481), (12.636827293, 8.34279906))
            Line((12.636827293, 8.34279906), (12.636827293, 17.757012623))
            ThreePointArc((12.636827293, 17.757012623), (12.343934074, 18.464119404), (11.636827293, 18.757012623))
            Line((11.636827293, 18.757012623), (-8.363172707, 18.757012623))
            ThreePointArc((-8.363172707, 18.757012623), (-9.070279488, 18.464119404), (-9.363172707, 17.757012623))
        make_face(mode=Mode.SUBTRACT)
        with Locations((-31.513172707, -12.392987377)):
            Rectangle(SKETCH_1_W, SKETCH_1_H, mode=Mode.SUBTRACT)
        with Locations((34.786827293, 13.907012623)):
            Rectangle(SKETCH_1_W, SKETCH_1_H, mode=Mode.SUBTRACT)
        with Locations((34.786827293, -12.392987377)):
            Rectangle(SKETCH_1_W, SKETCH_1_H, mode=Mode.SUBTRACT)
    extrude(amount=EXTRUDE_1_DEPTH)


solid = part.part
